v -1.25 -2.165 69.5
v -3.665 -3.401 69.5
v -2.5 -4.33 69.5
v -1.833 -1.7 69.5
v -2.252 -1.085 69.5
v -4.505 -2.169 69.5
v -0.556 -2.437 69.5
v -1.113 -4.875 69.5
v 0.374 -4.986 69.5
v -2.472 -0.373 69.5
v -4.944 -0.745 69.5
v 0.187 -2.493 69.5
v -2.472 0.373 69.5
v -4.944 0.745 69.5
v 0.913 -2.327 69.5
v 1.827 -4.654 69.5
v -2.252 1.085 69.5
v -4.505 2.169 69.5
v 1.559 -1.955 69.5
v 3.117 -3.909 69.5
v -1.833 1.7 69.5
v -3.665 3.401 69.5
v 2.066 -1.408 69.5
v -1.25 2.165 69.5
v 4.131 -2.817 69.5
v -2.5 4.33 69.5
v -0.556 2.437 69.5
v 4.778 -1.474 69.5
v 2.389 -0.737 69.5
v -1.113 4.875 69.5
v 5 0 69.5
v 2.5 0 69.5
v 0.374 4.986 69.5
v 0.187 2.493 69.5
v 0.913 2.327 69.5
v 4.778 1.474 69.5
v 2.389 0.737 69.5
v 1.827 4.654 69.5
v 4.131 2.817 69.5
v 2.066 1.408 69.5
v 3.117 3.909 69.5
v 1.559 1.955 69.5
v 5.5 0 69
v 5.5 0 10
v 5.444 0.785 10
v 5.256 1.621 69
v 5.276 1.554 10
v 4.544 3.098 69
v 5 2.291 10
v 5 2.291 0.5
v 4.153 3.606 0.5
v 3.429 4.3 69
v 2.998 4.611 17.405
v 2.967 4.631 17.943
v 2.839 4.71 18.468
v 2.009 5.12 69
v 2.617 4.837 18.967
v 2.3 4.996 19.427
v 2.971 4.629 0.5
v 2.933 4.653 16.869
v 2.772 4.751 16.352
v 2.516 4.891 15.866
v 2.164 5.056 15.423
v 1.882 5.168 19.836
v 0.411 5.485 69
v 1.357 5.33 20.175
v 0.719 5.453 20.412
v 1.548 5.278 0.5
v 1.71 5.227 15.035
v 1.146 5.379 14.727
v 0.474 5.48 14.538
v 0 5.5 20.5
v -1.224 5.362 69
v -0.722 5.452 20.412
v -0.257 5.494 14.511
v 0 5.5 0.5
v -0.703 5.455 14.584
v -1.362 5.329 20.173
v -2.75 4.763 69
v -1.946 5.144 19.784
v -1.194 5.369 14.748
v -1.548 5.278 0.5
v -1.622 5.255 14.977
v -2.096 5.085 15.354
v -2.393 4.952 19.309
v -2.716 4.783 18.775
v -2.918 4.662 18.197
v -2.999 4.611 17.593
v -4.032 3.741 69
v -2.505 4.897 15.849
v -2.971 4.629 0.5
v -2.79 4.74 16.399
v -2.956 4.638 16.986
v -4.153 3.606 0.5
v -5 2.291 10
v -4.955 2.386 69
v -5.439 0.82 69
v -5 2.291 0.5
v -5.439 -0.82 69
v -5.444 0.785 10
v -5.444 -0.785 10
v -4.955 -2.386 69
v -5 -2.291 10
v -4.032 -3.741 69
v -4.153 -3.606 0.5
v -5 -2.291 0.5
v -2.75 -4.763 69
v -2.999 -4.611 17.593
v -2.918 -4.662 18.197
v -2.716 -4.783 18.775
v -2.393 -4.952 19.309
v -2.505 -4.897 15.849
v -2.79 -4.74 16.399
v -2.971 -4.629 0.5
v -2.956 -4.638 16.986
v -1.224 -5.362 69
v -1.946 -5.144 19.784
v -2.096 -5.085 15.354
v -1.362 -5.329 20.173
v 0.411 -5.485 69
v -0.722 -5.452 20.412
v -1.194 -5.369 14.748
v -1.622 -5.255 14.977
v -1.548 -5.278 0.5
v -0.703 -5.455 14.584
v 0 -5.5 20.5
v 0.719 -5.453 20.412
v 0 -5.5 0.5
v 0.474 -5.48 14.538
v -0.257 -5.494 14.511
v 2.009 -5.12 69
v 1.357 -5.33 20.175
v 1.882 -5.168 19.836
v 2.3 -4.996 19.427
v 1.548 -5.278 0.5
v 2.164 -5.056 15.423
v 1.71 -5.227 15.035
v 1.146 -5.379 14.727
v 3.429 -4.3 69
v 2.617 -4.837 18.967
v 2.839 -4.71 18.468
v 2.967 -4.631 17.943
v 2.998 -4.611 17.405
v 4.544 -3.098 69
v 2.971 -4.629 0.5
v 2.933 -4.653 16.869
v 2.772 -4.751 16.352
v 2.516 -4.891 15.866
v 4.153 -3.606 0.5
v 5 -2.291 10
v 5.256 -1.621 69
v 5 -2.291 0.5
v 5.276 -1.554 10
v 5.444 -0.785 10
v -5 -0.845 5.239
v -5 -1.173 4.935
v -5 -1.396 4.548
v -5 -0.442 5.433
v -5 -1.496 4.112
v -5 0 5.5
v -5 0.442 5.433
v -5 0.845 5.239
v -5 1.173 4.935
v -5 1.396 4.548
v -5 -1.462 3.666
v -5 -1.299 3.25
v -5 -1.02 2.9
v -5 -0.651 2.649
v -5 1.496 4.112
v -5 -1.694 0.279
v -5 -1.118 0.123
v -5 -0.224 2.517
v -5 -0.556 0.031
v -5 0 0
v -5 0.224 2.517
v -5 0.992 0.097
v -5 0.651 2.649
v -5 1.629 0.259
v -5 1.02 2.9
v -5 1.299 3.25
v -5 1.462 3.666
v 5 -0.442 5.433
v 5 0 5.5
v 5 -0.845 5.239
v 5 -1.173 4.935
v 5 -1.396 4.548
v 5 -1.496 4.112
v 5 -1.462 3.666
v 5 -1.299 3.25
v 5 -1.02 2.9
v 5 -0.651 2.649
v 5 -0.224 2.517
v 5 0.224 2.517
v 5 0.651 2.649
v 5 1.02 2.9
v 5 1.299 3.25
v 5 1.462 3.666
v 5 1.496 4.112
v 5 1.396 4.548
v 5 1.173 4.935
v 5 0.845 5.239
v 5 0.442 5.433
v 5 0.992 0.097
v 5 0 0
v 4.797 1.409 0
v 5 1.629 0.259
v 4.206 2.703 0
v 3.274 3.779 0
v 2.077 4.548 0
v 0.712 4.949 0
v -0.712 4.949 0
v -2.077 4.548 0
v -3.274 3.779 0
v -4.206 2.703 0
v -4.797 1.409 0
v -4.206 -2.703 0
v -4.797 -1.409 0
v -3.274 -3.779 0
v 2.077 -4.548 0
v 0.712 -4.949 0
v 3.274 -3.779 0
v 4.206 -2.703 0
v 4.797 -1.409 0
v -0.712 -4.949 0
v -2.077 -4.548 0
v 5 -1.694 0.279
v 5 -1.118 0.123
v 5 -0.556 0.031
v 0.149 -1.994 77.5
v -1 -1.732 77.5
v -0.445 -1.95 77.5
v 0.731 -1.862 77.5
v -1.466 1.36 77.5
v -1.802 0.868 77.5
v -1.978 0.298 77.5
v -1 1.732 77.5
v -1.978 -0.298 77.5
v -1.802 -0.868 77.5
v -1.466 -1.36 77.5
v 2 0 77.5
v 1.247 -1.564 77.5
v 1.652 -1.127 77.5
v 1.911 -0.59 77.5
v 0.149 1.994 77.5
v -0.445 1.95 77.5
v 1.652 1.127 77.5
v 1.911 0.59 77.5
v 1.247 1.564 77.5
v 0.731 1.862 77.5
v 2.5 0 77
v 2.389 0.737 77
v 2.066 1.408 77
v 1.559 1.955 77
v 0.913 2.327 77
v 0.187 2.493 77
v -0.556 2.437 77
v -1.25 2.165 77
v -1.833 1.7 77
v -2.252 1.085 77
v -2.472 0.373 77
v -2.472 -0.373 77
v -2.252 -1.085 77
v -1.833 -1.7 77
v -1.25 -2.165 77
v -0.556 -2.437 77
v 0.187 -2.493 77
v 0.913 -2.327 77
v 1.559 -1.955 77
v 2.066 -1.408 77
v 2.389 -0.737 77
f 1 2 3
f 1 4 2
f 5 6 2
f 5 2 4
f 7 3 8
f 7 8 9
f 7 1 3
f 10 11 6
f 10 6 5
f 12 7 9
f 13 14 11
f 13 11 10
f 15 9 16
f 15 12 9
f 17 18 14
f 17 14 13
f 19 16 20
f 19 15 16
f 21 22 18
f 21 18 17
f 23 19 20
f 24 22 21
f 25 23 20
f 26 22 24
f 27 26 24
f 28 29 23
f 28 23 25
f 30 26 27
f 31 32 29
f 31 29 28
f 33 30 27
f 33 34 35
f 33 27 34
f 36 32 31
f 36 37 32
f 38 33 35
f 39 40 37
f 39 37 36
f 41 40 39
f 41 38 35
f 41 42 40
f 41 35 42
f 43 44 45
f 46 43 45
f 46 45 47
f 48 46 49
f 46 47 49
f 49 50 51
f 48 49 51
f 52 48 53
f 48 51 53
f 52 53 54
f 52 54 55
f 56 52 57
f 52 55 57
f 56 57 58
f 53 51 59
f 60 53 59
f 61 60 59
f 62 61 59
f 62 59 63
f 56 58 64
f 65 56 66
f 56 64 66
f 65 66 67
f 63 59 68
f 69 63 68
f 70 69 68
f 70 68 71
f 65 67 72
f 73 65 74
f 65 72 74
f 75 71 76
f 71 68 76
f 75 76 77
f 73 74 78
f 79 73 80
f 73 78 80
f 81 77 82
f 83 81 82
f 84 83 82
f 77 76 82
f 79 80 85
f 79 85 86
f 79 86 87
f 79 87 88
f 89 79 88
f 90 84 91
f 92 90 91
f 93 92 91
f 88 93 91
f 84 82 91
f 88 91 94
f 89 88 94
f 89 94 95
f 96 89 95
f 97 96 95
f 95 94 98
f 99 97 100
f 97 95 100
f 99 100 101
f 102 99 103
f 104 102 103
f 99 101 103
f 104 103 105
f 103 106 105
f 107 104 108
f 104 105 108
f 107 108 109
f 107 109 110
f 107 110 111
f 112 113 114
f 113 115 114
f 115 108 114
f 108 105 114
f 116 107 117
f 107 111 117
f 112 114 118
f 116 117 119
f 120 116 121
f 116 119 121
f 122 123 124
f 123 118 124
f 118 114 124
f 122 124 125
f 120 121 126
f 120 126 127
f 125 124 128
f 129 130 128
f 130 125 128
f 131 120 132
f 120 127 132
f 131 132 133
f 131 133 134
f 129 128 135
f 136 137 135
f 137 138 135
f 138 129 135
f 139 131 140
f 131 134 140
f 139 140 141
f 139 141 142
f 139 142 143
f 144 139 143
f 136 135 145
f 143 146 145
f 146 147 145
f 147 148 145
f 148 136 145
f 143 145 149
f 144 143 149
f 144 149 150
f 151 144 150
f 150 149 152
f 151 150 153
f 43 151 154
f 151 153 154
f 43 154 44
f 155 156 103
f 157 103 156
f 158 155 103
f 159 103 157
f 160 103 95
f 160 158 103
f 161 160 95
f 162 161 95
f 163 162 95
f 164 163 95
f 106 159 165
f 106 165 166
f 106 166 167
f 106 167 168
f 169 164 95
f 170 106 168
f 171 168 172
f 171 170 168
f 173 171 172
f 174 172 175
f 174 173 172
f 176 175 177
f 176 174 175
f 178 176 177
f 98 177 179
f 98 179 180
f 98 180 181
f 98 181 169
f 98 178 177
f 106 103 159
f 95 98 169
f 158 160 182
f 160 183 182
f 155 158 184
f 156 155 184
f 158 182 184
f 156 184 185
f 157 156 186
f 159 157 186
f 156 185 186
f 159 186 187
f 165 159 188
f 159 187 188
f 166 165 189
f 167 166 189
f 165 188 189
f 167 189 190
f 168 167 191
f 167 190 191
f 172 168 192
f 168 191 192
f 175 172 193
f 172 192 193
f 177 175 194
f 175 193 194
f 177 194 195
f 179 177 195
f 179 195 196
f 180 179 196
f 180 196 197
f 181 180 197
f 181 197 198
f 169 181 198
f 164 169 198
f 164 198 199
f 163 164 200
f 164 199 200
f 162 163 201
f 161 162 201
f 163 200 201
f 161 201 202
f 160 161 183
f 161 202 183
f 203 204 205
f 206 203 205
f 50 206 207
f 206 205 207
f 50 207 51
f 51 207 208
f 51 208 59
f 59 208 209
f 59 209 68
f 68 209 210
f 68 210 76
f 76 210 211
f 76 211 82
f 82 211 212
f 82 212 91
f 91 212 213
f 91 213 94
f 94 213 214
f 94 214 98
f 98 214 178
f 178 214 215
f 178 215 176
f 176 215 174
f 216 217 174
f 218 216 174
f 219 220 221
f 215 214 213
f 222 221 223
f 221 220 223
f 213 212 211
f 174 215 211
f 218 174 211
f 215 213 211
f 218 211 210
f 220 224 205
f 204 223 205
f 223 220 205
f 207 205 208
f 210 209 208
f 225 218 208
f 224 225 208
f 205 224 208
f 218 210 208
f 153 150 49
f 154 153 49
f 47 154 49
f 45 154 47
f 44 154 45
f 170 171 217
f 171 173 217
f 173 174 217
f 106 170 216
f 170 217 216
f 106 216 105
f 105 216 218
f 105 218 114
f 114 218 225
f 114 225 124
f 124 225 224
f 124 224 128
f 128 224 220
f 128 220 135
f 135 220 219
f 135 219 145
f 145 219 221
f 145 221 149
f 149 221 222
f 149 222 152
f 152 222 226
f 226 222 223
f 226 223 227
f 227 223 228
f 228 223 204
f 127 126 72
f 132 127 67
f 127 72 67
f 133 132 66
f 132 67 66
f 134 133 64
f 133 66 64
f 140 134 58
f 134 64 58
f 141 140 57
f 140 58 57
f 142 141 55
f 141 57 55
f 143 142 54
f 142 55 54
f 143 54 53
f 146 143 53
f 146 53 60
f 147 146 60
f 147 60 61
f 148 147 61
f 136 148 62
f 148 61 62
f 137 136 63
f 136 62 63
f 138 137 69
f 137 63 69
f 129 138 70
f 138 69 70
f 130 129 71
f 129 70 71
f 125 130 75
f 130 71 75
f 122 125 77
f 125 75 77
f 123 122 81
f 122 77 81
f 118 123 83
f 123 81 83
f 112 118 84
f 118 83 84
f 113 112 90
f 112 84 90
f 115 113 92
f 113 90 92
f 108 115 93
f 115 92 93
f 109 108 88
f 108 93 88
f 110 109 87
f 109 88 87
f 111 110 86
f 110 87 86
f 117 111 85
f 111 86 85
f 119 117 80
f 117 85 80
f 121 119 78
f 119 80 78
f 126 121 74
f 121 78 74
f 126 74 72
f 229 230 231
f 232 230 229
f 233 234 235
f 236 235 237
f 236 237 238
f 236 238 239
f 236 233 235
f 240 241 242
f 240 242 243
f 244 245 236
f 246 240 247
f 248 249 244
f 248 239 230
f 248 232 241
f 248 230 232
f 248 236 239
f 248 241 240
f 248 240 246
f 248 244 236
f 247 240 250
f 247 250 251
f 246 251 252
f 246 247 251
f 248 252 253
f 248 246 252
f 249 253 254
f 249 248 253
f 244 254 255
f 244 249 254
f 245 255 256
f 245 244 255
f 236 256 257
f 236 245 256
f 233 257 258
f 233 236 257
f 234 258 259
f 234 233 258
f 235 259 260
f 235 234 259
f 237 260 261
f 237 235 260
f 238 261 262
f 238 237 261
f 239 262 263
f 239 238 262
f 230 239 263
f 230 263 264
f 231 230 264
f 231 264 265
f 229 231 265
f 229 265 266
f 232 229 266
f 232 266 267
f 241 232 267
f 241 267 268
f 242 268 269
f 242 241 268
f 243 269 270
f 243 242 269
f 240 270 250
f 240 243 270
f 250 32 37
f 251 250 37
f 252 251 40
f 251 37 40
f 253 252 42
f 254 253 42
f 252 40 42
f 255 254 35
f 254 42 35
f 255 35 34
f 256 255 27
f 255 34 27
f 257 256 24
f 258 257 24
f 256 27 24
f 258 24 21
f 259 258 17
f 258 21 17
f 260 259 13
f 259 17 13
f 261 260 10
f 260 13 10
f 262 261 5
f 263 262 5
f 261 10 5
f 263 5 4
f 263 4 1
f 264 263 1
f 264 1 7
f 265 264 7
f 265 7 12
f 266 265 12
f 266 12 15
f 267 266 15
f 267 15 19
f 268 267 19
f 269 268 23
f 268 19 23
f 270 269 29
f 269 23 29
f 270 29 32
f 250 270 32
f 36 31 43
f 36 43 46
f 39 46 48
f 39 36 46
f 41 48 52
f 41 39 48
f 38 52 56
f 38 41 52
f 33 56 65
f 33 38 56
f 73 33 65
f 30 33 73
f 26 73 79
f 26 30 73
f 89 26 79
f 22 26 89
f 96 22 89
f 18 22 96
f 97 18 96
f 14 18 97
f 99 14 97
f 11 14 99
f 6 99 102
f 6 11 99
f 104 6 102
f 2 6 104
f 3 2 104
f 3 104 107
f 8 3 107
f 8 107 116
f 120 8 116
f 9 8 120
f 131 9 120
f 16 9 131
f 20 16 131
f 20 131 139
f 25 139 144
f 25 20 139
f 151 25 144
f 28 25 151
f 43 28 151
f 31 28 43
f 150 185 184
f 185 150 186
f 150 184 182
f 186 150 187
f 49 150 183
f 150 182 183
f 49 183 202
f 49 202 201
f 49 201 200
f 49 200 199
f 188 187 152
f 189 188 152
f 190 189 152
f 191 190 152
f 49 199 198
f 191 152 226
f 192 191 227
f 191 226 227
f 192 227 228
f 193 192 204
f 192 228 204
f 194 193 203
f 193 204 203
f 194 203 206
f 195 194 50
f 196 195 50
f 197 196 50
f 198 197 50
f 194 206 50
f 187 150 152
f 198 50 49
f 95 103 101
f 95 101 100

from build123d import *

# Parameters (mm, degrees)
SKETCH_1_R          = 5.5
EXTRUDE_1_DEPTH     = 69.5
CHAMFER_1_SIZE      = 0.5
SKETCH_2_R          = 2.5
EXTRUDE_2_DEPTH     = 8
CHAMFER_2_SIZE      = 0.5
SKETCH_5_R          = 1.5
CUT_EXTRUDE_3_DEPTH = 7.5
SKETCH_6_R          = 3
CUT_EXTRUDE_4_DEPTH = 7.5
SKETCH_7_W          = 2
SKETCH_7_H          = 10
CUT_EXTRUDE_5_DEPTH = 10


with BuildPart() as part:
    # 草图1 → 拉伸1 (new body)
    with BuildSketch(Plane.XY):
        Circle(SKETCH_1_R)
    extrude(amount=EXTRUDE_1_DEPTH)

    # 倒角1
    chamfer_1_edges = [part.edges().sort_by_distance(p)[0] for p in [
        (-5.5, 0, 0),
        (-5.5, 0, 69.5),
    ]]
    chamfer(chamfer_1_edges, length=CHAMFER_1_SIZE)

    # 草图2 → 拉伸2 (add)
    with BuildSketch(Plane.XY.offset(69.5)):
        Circle(SKETCH_2_R)
    extrude(amount=EXTRUDE_2_DEPTH)

    # 倒角2
    chamfer_2_edges = [part.edges().sort_by_distance(p)[0] for p in [
        (-2.5, 0, 77.5),
    ]]
    chamfer(chamfer_2_edges, length=CHAMFER_2_SIZE)

    # 草图5 → 拉伸3 (cut, symmetric)
    with BuildSketch(Plane(origin=(0, 0, 0), x_dir=(0, 0, -1), z_dir=(1, 0, 0))):
        with Locations(Location((-4, 0, 0), (0, 0, 180))):
            Circle(SKETCH_5_R)
    extrude(amount=CUT_EXTRUDE_3_DEPTH, both=True, mode=Mode.SUBTRACT)

    # 草图6 → 拉伸4 (cut, symmetric)
    with BuildSketch(Plane(origin=(0, 0, 0), x_dir=(1, 0, 0), z_dir=(0, 1, 0))):
        with Locations(Location((0, -17.5, 0), (0, 0, 270))):
            Circle(SKETCH_6_R)
    extrude(amount=CUT_EXTRUDE_4_DEPTH, both=True, mode=Mode.SUBTRACT)

    # 草图7 → 拉伸5 (cut)
    with BuildSketch(Plane.XY):
        with Locations((6, 0)):
            Rectangle(SKETCH_7_W, SKETCH_7_H)
    cut_extrude_5 = extrude(amount=CUT_EXTRUDE_5_DEPTH, mode=Mode.SUBTRACT)

    # 镜向1: 拉伸5 across plane
    add(cut_extrude_5.mirror(Plane(origin=(0, 0, 0), x_dir=(0, 0, 1), z_dir=(1, 0, 0))), mode=Mode.SUBTRACT)


solid = part.part
